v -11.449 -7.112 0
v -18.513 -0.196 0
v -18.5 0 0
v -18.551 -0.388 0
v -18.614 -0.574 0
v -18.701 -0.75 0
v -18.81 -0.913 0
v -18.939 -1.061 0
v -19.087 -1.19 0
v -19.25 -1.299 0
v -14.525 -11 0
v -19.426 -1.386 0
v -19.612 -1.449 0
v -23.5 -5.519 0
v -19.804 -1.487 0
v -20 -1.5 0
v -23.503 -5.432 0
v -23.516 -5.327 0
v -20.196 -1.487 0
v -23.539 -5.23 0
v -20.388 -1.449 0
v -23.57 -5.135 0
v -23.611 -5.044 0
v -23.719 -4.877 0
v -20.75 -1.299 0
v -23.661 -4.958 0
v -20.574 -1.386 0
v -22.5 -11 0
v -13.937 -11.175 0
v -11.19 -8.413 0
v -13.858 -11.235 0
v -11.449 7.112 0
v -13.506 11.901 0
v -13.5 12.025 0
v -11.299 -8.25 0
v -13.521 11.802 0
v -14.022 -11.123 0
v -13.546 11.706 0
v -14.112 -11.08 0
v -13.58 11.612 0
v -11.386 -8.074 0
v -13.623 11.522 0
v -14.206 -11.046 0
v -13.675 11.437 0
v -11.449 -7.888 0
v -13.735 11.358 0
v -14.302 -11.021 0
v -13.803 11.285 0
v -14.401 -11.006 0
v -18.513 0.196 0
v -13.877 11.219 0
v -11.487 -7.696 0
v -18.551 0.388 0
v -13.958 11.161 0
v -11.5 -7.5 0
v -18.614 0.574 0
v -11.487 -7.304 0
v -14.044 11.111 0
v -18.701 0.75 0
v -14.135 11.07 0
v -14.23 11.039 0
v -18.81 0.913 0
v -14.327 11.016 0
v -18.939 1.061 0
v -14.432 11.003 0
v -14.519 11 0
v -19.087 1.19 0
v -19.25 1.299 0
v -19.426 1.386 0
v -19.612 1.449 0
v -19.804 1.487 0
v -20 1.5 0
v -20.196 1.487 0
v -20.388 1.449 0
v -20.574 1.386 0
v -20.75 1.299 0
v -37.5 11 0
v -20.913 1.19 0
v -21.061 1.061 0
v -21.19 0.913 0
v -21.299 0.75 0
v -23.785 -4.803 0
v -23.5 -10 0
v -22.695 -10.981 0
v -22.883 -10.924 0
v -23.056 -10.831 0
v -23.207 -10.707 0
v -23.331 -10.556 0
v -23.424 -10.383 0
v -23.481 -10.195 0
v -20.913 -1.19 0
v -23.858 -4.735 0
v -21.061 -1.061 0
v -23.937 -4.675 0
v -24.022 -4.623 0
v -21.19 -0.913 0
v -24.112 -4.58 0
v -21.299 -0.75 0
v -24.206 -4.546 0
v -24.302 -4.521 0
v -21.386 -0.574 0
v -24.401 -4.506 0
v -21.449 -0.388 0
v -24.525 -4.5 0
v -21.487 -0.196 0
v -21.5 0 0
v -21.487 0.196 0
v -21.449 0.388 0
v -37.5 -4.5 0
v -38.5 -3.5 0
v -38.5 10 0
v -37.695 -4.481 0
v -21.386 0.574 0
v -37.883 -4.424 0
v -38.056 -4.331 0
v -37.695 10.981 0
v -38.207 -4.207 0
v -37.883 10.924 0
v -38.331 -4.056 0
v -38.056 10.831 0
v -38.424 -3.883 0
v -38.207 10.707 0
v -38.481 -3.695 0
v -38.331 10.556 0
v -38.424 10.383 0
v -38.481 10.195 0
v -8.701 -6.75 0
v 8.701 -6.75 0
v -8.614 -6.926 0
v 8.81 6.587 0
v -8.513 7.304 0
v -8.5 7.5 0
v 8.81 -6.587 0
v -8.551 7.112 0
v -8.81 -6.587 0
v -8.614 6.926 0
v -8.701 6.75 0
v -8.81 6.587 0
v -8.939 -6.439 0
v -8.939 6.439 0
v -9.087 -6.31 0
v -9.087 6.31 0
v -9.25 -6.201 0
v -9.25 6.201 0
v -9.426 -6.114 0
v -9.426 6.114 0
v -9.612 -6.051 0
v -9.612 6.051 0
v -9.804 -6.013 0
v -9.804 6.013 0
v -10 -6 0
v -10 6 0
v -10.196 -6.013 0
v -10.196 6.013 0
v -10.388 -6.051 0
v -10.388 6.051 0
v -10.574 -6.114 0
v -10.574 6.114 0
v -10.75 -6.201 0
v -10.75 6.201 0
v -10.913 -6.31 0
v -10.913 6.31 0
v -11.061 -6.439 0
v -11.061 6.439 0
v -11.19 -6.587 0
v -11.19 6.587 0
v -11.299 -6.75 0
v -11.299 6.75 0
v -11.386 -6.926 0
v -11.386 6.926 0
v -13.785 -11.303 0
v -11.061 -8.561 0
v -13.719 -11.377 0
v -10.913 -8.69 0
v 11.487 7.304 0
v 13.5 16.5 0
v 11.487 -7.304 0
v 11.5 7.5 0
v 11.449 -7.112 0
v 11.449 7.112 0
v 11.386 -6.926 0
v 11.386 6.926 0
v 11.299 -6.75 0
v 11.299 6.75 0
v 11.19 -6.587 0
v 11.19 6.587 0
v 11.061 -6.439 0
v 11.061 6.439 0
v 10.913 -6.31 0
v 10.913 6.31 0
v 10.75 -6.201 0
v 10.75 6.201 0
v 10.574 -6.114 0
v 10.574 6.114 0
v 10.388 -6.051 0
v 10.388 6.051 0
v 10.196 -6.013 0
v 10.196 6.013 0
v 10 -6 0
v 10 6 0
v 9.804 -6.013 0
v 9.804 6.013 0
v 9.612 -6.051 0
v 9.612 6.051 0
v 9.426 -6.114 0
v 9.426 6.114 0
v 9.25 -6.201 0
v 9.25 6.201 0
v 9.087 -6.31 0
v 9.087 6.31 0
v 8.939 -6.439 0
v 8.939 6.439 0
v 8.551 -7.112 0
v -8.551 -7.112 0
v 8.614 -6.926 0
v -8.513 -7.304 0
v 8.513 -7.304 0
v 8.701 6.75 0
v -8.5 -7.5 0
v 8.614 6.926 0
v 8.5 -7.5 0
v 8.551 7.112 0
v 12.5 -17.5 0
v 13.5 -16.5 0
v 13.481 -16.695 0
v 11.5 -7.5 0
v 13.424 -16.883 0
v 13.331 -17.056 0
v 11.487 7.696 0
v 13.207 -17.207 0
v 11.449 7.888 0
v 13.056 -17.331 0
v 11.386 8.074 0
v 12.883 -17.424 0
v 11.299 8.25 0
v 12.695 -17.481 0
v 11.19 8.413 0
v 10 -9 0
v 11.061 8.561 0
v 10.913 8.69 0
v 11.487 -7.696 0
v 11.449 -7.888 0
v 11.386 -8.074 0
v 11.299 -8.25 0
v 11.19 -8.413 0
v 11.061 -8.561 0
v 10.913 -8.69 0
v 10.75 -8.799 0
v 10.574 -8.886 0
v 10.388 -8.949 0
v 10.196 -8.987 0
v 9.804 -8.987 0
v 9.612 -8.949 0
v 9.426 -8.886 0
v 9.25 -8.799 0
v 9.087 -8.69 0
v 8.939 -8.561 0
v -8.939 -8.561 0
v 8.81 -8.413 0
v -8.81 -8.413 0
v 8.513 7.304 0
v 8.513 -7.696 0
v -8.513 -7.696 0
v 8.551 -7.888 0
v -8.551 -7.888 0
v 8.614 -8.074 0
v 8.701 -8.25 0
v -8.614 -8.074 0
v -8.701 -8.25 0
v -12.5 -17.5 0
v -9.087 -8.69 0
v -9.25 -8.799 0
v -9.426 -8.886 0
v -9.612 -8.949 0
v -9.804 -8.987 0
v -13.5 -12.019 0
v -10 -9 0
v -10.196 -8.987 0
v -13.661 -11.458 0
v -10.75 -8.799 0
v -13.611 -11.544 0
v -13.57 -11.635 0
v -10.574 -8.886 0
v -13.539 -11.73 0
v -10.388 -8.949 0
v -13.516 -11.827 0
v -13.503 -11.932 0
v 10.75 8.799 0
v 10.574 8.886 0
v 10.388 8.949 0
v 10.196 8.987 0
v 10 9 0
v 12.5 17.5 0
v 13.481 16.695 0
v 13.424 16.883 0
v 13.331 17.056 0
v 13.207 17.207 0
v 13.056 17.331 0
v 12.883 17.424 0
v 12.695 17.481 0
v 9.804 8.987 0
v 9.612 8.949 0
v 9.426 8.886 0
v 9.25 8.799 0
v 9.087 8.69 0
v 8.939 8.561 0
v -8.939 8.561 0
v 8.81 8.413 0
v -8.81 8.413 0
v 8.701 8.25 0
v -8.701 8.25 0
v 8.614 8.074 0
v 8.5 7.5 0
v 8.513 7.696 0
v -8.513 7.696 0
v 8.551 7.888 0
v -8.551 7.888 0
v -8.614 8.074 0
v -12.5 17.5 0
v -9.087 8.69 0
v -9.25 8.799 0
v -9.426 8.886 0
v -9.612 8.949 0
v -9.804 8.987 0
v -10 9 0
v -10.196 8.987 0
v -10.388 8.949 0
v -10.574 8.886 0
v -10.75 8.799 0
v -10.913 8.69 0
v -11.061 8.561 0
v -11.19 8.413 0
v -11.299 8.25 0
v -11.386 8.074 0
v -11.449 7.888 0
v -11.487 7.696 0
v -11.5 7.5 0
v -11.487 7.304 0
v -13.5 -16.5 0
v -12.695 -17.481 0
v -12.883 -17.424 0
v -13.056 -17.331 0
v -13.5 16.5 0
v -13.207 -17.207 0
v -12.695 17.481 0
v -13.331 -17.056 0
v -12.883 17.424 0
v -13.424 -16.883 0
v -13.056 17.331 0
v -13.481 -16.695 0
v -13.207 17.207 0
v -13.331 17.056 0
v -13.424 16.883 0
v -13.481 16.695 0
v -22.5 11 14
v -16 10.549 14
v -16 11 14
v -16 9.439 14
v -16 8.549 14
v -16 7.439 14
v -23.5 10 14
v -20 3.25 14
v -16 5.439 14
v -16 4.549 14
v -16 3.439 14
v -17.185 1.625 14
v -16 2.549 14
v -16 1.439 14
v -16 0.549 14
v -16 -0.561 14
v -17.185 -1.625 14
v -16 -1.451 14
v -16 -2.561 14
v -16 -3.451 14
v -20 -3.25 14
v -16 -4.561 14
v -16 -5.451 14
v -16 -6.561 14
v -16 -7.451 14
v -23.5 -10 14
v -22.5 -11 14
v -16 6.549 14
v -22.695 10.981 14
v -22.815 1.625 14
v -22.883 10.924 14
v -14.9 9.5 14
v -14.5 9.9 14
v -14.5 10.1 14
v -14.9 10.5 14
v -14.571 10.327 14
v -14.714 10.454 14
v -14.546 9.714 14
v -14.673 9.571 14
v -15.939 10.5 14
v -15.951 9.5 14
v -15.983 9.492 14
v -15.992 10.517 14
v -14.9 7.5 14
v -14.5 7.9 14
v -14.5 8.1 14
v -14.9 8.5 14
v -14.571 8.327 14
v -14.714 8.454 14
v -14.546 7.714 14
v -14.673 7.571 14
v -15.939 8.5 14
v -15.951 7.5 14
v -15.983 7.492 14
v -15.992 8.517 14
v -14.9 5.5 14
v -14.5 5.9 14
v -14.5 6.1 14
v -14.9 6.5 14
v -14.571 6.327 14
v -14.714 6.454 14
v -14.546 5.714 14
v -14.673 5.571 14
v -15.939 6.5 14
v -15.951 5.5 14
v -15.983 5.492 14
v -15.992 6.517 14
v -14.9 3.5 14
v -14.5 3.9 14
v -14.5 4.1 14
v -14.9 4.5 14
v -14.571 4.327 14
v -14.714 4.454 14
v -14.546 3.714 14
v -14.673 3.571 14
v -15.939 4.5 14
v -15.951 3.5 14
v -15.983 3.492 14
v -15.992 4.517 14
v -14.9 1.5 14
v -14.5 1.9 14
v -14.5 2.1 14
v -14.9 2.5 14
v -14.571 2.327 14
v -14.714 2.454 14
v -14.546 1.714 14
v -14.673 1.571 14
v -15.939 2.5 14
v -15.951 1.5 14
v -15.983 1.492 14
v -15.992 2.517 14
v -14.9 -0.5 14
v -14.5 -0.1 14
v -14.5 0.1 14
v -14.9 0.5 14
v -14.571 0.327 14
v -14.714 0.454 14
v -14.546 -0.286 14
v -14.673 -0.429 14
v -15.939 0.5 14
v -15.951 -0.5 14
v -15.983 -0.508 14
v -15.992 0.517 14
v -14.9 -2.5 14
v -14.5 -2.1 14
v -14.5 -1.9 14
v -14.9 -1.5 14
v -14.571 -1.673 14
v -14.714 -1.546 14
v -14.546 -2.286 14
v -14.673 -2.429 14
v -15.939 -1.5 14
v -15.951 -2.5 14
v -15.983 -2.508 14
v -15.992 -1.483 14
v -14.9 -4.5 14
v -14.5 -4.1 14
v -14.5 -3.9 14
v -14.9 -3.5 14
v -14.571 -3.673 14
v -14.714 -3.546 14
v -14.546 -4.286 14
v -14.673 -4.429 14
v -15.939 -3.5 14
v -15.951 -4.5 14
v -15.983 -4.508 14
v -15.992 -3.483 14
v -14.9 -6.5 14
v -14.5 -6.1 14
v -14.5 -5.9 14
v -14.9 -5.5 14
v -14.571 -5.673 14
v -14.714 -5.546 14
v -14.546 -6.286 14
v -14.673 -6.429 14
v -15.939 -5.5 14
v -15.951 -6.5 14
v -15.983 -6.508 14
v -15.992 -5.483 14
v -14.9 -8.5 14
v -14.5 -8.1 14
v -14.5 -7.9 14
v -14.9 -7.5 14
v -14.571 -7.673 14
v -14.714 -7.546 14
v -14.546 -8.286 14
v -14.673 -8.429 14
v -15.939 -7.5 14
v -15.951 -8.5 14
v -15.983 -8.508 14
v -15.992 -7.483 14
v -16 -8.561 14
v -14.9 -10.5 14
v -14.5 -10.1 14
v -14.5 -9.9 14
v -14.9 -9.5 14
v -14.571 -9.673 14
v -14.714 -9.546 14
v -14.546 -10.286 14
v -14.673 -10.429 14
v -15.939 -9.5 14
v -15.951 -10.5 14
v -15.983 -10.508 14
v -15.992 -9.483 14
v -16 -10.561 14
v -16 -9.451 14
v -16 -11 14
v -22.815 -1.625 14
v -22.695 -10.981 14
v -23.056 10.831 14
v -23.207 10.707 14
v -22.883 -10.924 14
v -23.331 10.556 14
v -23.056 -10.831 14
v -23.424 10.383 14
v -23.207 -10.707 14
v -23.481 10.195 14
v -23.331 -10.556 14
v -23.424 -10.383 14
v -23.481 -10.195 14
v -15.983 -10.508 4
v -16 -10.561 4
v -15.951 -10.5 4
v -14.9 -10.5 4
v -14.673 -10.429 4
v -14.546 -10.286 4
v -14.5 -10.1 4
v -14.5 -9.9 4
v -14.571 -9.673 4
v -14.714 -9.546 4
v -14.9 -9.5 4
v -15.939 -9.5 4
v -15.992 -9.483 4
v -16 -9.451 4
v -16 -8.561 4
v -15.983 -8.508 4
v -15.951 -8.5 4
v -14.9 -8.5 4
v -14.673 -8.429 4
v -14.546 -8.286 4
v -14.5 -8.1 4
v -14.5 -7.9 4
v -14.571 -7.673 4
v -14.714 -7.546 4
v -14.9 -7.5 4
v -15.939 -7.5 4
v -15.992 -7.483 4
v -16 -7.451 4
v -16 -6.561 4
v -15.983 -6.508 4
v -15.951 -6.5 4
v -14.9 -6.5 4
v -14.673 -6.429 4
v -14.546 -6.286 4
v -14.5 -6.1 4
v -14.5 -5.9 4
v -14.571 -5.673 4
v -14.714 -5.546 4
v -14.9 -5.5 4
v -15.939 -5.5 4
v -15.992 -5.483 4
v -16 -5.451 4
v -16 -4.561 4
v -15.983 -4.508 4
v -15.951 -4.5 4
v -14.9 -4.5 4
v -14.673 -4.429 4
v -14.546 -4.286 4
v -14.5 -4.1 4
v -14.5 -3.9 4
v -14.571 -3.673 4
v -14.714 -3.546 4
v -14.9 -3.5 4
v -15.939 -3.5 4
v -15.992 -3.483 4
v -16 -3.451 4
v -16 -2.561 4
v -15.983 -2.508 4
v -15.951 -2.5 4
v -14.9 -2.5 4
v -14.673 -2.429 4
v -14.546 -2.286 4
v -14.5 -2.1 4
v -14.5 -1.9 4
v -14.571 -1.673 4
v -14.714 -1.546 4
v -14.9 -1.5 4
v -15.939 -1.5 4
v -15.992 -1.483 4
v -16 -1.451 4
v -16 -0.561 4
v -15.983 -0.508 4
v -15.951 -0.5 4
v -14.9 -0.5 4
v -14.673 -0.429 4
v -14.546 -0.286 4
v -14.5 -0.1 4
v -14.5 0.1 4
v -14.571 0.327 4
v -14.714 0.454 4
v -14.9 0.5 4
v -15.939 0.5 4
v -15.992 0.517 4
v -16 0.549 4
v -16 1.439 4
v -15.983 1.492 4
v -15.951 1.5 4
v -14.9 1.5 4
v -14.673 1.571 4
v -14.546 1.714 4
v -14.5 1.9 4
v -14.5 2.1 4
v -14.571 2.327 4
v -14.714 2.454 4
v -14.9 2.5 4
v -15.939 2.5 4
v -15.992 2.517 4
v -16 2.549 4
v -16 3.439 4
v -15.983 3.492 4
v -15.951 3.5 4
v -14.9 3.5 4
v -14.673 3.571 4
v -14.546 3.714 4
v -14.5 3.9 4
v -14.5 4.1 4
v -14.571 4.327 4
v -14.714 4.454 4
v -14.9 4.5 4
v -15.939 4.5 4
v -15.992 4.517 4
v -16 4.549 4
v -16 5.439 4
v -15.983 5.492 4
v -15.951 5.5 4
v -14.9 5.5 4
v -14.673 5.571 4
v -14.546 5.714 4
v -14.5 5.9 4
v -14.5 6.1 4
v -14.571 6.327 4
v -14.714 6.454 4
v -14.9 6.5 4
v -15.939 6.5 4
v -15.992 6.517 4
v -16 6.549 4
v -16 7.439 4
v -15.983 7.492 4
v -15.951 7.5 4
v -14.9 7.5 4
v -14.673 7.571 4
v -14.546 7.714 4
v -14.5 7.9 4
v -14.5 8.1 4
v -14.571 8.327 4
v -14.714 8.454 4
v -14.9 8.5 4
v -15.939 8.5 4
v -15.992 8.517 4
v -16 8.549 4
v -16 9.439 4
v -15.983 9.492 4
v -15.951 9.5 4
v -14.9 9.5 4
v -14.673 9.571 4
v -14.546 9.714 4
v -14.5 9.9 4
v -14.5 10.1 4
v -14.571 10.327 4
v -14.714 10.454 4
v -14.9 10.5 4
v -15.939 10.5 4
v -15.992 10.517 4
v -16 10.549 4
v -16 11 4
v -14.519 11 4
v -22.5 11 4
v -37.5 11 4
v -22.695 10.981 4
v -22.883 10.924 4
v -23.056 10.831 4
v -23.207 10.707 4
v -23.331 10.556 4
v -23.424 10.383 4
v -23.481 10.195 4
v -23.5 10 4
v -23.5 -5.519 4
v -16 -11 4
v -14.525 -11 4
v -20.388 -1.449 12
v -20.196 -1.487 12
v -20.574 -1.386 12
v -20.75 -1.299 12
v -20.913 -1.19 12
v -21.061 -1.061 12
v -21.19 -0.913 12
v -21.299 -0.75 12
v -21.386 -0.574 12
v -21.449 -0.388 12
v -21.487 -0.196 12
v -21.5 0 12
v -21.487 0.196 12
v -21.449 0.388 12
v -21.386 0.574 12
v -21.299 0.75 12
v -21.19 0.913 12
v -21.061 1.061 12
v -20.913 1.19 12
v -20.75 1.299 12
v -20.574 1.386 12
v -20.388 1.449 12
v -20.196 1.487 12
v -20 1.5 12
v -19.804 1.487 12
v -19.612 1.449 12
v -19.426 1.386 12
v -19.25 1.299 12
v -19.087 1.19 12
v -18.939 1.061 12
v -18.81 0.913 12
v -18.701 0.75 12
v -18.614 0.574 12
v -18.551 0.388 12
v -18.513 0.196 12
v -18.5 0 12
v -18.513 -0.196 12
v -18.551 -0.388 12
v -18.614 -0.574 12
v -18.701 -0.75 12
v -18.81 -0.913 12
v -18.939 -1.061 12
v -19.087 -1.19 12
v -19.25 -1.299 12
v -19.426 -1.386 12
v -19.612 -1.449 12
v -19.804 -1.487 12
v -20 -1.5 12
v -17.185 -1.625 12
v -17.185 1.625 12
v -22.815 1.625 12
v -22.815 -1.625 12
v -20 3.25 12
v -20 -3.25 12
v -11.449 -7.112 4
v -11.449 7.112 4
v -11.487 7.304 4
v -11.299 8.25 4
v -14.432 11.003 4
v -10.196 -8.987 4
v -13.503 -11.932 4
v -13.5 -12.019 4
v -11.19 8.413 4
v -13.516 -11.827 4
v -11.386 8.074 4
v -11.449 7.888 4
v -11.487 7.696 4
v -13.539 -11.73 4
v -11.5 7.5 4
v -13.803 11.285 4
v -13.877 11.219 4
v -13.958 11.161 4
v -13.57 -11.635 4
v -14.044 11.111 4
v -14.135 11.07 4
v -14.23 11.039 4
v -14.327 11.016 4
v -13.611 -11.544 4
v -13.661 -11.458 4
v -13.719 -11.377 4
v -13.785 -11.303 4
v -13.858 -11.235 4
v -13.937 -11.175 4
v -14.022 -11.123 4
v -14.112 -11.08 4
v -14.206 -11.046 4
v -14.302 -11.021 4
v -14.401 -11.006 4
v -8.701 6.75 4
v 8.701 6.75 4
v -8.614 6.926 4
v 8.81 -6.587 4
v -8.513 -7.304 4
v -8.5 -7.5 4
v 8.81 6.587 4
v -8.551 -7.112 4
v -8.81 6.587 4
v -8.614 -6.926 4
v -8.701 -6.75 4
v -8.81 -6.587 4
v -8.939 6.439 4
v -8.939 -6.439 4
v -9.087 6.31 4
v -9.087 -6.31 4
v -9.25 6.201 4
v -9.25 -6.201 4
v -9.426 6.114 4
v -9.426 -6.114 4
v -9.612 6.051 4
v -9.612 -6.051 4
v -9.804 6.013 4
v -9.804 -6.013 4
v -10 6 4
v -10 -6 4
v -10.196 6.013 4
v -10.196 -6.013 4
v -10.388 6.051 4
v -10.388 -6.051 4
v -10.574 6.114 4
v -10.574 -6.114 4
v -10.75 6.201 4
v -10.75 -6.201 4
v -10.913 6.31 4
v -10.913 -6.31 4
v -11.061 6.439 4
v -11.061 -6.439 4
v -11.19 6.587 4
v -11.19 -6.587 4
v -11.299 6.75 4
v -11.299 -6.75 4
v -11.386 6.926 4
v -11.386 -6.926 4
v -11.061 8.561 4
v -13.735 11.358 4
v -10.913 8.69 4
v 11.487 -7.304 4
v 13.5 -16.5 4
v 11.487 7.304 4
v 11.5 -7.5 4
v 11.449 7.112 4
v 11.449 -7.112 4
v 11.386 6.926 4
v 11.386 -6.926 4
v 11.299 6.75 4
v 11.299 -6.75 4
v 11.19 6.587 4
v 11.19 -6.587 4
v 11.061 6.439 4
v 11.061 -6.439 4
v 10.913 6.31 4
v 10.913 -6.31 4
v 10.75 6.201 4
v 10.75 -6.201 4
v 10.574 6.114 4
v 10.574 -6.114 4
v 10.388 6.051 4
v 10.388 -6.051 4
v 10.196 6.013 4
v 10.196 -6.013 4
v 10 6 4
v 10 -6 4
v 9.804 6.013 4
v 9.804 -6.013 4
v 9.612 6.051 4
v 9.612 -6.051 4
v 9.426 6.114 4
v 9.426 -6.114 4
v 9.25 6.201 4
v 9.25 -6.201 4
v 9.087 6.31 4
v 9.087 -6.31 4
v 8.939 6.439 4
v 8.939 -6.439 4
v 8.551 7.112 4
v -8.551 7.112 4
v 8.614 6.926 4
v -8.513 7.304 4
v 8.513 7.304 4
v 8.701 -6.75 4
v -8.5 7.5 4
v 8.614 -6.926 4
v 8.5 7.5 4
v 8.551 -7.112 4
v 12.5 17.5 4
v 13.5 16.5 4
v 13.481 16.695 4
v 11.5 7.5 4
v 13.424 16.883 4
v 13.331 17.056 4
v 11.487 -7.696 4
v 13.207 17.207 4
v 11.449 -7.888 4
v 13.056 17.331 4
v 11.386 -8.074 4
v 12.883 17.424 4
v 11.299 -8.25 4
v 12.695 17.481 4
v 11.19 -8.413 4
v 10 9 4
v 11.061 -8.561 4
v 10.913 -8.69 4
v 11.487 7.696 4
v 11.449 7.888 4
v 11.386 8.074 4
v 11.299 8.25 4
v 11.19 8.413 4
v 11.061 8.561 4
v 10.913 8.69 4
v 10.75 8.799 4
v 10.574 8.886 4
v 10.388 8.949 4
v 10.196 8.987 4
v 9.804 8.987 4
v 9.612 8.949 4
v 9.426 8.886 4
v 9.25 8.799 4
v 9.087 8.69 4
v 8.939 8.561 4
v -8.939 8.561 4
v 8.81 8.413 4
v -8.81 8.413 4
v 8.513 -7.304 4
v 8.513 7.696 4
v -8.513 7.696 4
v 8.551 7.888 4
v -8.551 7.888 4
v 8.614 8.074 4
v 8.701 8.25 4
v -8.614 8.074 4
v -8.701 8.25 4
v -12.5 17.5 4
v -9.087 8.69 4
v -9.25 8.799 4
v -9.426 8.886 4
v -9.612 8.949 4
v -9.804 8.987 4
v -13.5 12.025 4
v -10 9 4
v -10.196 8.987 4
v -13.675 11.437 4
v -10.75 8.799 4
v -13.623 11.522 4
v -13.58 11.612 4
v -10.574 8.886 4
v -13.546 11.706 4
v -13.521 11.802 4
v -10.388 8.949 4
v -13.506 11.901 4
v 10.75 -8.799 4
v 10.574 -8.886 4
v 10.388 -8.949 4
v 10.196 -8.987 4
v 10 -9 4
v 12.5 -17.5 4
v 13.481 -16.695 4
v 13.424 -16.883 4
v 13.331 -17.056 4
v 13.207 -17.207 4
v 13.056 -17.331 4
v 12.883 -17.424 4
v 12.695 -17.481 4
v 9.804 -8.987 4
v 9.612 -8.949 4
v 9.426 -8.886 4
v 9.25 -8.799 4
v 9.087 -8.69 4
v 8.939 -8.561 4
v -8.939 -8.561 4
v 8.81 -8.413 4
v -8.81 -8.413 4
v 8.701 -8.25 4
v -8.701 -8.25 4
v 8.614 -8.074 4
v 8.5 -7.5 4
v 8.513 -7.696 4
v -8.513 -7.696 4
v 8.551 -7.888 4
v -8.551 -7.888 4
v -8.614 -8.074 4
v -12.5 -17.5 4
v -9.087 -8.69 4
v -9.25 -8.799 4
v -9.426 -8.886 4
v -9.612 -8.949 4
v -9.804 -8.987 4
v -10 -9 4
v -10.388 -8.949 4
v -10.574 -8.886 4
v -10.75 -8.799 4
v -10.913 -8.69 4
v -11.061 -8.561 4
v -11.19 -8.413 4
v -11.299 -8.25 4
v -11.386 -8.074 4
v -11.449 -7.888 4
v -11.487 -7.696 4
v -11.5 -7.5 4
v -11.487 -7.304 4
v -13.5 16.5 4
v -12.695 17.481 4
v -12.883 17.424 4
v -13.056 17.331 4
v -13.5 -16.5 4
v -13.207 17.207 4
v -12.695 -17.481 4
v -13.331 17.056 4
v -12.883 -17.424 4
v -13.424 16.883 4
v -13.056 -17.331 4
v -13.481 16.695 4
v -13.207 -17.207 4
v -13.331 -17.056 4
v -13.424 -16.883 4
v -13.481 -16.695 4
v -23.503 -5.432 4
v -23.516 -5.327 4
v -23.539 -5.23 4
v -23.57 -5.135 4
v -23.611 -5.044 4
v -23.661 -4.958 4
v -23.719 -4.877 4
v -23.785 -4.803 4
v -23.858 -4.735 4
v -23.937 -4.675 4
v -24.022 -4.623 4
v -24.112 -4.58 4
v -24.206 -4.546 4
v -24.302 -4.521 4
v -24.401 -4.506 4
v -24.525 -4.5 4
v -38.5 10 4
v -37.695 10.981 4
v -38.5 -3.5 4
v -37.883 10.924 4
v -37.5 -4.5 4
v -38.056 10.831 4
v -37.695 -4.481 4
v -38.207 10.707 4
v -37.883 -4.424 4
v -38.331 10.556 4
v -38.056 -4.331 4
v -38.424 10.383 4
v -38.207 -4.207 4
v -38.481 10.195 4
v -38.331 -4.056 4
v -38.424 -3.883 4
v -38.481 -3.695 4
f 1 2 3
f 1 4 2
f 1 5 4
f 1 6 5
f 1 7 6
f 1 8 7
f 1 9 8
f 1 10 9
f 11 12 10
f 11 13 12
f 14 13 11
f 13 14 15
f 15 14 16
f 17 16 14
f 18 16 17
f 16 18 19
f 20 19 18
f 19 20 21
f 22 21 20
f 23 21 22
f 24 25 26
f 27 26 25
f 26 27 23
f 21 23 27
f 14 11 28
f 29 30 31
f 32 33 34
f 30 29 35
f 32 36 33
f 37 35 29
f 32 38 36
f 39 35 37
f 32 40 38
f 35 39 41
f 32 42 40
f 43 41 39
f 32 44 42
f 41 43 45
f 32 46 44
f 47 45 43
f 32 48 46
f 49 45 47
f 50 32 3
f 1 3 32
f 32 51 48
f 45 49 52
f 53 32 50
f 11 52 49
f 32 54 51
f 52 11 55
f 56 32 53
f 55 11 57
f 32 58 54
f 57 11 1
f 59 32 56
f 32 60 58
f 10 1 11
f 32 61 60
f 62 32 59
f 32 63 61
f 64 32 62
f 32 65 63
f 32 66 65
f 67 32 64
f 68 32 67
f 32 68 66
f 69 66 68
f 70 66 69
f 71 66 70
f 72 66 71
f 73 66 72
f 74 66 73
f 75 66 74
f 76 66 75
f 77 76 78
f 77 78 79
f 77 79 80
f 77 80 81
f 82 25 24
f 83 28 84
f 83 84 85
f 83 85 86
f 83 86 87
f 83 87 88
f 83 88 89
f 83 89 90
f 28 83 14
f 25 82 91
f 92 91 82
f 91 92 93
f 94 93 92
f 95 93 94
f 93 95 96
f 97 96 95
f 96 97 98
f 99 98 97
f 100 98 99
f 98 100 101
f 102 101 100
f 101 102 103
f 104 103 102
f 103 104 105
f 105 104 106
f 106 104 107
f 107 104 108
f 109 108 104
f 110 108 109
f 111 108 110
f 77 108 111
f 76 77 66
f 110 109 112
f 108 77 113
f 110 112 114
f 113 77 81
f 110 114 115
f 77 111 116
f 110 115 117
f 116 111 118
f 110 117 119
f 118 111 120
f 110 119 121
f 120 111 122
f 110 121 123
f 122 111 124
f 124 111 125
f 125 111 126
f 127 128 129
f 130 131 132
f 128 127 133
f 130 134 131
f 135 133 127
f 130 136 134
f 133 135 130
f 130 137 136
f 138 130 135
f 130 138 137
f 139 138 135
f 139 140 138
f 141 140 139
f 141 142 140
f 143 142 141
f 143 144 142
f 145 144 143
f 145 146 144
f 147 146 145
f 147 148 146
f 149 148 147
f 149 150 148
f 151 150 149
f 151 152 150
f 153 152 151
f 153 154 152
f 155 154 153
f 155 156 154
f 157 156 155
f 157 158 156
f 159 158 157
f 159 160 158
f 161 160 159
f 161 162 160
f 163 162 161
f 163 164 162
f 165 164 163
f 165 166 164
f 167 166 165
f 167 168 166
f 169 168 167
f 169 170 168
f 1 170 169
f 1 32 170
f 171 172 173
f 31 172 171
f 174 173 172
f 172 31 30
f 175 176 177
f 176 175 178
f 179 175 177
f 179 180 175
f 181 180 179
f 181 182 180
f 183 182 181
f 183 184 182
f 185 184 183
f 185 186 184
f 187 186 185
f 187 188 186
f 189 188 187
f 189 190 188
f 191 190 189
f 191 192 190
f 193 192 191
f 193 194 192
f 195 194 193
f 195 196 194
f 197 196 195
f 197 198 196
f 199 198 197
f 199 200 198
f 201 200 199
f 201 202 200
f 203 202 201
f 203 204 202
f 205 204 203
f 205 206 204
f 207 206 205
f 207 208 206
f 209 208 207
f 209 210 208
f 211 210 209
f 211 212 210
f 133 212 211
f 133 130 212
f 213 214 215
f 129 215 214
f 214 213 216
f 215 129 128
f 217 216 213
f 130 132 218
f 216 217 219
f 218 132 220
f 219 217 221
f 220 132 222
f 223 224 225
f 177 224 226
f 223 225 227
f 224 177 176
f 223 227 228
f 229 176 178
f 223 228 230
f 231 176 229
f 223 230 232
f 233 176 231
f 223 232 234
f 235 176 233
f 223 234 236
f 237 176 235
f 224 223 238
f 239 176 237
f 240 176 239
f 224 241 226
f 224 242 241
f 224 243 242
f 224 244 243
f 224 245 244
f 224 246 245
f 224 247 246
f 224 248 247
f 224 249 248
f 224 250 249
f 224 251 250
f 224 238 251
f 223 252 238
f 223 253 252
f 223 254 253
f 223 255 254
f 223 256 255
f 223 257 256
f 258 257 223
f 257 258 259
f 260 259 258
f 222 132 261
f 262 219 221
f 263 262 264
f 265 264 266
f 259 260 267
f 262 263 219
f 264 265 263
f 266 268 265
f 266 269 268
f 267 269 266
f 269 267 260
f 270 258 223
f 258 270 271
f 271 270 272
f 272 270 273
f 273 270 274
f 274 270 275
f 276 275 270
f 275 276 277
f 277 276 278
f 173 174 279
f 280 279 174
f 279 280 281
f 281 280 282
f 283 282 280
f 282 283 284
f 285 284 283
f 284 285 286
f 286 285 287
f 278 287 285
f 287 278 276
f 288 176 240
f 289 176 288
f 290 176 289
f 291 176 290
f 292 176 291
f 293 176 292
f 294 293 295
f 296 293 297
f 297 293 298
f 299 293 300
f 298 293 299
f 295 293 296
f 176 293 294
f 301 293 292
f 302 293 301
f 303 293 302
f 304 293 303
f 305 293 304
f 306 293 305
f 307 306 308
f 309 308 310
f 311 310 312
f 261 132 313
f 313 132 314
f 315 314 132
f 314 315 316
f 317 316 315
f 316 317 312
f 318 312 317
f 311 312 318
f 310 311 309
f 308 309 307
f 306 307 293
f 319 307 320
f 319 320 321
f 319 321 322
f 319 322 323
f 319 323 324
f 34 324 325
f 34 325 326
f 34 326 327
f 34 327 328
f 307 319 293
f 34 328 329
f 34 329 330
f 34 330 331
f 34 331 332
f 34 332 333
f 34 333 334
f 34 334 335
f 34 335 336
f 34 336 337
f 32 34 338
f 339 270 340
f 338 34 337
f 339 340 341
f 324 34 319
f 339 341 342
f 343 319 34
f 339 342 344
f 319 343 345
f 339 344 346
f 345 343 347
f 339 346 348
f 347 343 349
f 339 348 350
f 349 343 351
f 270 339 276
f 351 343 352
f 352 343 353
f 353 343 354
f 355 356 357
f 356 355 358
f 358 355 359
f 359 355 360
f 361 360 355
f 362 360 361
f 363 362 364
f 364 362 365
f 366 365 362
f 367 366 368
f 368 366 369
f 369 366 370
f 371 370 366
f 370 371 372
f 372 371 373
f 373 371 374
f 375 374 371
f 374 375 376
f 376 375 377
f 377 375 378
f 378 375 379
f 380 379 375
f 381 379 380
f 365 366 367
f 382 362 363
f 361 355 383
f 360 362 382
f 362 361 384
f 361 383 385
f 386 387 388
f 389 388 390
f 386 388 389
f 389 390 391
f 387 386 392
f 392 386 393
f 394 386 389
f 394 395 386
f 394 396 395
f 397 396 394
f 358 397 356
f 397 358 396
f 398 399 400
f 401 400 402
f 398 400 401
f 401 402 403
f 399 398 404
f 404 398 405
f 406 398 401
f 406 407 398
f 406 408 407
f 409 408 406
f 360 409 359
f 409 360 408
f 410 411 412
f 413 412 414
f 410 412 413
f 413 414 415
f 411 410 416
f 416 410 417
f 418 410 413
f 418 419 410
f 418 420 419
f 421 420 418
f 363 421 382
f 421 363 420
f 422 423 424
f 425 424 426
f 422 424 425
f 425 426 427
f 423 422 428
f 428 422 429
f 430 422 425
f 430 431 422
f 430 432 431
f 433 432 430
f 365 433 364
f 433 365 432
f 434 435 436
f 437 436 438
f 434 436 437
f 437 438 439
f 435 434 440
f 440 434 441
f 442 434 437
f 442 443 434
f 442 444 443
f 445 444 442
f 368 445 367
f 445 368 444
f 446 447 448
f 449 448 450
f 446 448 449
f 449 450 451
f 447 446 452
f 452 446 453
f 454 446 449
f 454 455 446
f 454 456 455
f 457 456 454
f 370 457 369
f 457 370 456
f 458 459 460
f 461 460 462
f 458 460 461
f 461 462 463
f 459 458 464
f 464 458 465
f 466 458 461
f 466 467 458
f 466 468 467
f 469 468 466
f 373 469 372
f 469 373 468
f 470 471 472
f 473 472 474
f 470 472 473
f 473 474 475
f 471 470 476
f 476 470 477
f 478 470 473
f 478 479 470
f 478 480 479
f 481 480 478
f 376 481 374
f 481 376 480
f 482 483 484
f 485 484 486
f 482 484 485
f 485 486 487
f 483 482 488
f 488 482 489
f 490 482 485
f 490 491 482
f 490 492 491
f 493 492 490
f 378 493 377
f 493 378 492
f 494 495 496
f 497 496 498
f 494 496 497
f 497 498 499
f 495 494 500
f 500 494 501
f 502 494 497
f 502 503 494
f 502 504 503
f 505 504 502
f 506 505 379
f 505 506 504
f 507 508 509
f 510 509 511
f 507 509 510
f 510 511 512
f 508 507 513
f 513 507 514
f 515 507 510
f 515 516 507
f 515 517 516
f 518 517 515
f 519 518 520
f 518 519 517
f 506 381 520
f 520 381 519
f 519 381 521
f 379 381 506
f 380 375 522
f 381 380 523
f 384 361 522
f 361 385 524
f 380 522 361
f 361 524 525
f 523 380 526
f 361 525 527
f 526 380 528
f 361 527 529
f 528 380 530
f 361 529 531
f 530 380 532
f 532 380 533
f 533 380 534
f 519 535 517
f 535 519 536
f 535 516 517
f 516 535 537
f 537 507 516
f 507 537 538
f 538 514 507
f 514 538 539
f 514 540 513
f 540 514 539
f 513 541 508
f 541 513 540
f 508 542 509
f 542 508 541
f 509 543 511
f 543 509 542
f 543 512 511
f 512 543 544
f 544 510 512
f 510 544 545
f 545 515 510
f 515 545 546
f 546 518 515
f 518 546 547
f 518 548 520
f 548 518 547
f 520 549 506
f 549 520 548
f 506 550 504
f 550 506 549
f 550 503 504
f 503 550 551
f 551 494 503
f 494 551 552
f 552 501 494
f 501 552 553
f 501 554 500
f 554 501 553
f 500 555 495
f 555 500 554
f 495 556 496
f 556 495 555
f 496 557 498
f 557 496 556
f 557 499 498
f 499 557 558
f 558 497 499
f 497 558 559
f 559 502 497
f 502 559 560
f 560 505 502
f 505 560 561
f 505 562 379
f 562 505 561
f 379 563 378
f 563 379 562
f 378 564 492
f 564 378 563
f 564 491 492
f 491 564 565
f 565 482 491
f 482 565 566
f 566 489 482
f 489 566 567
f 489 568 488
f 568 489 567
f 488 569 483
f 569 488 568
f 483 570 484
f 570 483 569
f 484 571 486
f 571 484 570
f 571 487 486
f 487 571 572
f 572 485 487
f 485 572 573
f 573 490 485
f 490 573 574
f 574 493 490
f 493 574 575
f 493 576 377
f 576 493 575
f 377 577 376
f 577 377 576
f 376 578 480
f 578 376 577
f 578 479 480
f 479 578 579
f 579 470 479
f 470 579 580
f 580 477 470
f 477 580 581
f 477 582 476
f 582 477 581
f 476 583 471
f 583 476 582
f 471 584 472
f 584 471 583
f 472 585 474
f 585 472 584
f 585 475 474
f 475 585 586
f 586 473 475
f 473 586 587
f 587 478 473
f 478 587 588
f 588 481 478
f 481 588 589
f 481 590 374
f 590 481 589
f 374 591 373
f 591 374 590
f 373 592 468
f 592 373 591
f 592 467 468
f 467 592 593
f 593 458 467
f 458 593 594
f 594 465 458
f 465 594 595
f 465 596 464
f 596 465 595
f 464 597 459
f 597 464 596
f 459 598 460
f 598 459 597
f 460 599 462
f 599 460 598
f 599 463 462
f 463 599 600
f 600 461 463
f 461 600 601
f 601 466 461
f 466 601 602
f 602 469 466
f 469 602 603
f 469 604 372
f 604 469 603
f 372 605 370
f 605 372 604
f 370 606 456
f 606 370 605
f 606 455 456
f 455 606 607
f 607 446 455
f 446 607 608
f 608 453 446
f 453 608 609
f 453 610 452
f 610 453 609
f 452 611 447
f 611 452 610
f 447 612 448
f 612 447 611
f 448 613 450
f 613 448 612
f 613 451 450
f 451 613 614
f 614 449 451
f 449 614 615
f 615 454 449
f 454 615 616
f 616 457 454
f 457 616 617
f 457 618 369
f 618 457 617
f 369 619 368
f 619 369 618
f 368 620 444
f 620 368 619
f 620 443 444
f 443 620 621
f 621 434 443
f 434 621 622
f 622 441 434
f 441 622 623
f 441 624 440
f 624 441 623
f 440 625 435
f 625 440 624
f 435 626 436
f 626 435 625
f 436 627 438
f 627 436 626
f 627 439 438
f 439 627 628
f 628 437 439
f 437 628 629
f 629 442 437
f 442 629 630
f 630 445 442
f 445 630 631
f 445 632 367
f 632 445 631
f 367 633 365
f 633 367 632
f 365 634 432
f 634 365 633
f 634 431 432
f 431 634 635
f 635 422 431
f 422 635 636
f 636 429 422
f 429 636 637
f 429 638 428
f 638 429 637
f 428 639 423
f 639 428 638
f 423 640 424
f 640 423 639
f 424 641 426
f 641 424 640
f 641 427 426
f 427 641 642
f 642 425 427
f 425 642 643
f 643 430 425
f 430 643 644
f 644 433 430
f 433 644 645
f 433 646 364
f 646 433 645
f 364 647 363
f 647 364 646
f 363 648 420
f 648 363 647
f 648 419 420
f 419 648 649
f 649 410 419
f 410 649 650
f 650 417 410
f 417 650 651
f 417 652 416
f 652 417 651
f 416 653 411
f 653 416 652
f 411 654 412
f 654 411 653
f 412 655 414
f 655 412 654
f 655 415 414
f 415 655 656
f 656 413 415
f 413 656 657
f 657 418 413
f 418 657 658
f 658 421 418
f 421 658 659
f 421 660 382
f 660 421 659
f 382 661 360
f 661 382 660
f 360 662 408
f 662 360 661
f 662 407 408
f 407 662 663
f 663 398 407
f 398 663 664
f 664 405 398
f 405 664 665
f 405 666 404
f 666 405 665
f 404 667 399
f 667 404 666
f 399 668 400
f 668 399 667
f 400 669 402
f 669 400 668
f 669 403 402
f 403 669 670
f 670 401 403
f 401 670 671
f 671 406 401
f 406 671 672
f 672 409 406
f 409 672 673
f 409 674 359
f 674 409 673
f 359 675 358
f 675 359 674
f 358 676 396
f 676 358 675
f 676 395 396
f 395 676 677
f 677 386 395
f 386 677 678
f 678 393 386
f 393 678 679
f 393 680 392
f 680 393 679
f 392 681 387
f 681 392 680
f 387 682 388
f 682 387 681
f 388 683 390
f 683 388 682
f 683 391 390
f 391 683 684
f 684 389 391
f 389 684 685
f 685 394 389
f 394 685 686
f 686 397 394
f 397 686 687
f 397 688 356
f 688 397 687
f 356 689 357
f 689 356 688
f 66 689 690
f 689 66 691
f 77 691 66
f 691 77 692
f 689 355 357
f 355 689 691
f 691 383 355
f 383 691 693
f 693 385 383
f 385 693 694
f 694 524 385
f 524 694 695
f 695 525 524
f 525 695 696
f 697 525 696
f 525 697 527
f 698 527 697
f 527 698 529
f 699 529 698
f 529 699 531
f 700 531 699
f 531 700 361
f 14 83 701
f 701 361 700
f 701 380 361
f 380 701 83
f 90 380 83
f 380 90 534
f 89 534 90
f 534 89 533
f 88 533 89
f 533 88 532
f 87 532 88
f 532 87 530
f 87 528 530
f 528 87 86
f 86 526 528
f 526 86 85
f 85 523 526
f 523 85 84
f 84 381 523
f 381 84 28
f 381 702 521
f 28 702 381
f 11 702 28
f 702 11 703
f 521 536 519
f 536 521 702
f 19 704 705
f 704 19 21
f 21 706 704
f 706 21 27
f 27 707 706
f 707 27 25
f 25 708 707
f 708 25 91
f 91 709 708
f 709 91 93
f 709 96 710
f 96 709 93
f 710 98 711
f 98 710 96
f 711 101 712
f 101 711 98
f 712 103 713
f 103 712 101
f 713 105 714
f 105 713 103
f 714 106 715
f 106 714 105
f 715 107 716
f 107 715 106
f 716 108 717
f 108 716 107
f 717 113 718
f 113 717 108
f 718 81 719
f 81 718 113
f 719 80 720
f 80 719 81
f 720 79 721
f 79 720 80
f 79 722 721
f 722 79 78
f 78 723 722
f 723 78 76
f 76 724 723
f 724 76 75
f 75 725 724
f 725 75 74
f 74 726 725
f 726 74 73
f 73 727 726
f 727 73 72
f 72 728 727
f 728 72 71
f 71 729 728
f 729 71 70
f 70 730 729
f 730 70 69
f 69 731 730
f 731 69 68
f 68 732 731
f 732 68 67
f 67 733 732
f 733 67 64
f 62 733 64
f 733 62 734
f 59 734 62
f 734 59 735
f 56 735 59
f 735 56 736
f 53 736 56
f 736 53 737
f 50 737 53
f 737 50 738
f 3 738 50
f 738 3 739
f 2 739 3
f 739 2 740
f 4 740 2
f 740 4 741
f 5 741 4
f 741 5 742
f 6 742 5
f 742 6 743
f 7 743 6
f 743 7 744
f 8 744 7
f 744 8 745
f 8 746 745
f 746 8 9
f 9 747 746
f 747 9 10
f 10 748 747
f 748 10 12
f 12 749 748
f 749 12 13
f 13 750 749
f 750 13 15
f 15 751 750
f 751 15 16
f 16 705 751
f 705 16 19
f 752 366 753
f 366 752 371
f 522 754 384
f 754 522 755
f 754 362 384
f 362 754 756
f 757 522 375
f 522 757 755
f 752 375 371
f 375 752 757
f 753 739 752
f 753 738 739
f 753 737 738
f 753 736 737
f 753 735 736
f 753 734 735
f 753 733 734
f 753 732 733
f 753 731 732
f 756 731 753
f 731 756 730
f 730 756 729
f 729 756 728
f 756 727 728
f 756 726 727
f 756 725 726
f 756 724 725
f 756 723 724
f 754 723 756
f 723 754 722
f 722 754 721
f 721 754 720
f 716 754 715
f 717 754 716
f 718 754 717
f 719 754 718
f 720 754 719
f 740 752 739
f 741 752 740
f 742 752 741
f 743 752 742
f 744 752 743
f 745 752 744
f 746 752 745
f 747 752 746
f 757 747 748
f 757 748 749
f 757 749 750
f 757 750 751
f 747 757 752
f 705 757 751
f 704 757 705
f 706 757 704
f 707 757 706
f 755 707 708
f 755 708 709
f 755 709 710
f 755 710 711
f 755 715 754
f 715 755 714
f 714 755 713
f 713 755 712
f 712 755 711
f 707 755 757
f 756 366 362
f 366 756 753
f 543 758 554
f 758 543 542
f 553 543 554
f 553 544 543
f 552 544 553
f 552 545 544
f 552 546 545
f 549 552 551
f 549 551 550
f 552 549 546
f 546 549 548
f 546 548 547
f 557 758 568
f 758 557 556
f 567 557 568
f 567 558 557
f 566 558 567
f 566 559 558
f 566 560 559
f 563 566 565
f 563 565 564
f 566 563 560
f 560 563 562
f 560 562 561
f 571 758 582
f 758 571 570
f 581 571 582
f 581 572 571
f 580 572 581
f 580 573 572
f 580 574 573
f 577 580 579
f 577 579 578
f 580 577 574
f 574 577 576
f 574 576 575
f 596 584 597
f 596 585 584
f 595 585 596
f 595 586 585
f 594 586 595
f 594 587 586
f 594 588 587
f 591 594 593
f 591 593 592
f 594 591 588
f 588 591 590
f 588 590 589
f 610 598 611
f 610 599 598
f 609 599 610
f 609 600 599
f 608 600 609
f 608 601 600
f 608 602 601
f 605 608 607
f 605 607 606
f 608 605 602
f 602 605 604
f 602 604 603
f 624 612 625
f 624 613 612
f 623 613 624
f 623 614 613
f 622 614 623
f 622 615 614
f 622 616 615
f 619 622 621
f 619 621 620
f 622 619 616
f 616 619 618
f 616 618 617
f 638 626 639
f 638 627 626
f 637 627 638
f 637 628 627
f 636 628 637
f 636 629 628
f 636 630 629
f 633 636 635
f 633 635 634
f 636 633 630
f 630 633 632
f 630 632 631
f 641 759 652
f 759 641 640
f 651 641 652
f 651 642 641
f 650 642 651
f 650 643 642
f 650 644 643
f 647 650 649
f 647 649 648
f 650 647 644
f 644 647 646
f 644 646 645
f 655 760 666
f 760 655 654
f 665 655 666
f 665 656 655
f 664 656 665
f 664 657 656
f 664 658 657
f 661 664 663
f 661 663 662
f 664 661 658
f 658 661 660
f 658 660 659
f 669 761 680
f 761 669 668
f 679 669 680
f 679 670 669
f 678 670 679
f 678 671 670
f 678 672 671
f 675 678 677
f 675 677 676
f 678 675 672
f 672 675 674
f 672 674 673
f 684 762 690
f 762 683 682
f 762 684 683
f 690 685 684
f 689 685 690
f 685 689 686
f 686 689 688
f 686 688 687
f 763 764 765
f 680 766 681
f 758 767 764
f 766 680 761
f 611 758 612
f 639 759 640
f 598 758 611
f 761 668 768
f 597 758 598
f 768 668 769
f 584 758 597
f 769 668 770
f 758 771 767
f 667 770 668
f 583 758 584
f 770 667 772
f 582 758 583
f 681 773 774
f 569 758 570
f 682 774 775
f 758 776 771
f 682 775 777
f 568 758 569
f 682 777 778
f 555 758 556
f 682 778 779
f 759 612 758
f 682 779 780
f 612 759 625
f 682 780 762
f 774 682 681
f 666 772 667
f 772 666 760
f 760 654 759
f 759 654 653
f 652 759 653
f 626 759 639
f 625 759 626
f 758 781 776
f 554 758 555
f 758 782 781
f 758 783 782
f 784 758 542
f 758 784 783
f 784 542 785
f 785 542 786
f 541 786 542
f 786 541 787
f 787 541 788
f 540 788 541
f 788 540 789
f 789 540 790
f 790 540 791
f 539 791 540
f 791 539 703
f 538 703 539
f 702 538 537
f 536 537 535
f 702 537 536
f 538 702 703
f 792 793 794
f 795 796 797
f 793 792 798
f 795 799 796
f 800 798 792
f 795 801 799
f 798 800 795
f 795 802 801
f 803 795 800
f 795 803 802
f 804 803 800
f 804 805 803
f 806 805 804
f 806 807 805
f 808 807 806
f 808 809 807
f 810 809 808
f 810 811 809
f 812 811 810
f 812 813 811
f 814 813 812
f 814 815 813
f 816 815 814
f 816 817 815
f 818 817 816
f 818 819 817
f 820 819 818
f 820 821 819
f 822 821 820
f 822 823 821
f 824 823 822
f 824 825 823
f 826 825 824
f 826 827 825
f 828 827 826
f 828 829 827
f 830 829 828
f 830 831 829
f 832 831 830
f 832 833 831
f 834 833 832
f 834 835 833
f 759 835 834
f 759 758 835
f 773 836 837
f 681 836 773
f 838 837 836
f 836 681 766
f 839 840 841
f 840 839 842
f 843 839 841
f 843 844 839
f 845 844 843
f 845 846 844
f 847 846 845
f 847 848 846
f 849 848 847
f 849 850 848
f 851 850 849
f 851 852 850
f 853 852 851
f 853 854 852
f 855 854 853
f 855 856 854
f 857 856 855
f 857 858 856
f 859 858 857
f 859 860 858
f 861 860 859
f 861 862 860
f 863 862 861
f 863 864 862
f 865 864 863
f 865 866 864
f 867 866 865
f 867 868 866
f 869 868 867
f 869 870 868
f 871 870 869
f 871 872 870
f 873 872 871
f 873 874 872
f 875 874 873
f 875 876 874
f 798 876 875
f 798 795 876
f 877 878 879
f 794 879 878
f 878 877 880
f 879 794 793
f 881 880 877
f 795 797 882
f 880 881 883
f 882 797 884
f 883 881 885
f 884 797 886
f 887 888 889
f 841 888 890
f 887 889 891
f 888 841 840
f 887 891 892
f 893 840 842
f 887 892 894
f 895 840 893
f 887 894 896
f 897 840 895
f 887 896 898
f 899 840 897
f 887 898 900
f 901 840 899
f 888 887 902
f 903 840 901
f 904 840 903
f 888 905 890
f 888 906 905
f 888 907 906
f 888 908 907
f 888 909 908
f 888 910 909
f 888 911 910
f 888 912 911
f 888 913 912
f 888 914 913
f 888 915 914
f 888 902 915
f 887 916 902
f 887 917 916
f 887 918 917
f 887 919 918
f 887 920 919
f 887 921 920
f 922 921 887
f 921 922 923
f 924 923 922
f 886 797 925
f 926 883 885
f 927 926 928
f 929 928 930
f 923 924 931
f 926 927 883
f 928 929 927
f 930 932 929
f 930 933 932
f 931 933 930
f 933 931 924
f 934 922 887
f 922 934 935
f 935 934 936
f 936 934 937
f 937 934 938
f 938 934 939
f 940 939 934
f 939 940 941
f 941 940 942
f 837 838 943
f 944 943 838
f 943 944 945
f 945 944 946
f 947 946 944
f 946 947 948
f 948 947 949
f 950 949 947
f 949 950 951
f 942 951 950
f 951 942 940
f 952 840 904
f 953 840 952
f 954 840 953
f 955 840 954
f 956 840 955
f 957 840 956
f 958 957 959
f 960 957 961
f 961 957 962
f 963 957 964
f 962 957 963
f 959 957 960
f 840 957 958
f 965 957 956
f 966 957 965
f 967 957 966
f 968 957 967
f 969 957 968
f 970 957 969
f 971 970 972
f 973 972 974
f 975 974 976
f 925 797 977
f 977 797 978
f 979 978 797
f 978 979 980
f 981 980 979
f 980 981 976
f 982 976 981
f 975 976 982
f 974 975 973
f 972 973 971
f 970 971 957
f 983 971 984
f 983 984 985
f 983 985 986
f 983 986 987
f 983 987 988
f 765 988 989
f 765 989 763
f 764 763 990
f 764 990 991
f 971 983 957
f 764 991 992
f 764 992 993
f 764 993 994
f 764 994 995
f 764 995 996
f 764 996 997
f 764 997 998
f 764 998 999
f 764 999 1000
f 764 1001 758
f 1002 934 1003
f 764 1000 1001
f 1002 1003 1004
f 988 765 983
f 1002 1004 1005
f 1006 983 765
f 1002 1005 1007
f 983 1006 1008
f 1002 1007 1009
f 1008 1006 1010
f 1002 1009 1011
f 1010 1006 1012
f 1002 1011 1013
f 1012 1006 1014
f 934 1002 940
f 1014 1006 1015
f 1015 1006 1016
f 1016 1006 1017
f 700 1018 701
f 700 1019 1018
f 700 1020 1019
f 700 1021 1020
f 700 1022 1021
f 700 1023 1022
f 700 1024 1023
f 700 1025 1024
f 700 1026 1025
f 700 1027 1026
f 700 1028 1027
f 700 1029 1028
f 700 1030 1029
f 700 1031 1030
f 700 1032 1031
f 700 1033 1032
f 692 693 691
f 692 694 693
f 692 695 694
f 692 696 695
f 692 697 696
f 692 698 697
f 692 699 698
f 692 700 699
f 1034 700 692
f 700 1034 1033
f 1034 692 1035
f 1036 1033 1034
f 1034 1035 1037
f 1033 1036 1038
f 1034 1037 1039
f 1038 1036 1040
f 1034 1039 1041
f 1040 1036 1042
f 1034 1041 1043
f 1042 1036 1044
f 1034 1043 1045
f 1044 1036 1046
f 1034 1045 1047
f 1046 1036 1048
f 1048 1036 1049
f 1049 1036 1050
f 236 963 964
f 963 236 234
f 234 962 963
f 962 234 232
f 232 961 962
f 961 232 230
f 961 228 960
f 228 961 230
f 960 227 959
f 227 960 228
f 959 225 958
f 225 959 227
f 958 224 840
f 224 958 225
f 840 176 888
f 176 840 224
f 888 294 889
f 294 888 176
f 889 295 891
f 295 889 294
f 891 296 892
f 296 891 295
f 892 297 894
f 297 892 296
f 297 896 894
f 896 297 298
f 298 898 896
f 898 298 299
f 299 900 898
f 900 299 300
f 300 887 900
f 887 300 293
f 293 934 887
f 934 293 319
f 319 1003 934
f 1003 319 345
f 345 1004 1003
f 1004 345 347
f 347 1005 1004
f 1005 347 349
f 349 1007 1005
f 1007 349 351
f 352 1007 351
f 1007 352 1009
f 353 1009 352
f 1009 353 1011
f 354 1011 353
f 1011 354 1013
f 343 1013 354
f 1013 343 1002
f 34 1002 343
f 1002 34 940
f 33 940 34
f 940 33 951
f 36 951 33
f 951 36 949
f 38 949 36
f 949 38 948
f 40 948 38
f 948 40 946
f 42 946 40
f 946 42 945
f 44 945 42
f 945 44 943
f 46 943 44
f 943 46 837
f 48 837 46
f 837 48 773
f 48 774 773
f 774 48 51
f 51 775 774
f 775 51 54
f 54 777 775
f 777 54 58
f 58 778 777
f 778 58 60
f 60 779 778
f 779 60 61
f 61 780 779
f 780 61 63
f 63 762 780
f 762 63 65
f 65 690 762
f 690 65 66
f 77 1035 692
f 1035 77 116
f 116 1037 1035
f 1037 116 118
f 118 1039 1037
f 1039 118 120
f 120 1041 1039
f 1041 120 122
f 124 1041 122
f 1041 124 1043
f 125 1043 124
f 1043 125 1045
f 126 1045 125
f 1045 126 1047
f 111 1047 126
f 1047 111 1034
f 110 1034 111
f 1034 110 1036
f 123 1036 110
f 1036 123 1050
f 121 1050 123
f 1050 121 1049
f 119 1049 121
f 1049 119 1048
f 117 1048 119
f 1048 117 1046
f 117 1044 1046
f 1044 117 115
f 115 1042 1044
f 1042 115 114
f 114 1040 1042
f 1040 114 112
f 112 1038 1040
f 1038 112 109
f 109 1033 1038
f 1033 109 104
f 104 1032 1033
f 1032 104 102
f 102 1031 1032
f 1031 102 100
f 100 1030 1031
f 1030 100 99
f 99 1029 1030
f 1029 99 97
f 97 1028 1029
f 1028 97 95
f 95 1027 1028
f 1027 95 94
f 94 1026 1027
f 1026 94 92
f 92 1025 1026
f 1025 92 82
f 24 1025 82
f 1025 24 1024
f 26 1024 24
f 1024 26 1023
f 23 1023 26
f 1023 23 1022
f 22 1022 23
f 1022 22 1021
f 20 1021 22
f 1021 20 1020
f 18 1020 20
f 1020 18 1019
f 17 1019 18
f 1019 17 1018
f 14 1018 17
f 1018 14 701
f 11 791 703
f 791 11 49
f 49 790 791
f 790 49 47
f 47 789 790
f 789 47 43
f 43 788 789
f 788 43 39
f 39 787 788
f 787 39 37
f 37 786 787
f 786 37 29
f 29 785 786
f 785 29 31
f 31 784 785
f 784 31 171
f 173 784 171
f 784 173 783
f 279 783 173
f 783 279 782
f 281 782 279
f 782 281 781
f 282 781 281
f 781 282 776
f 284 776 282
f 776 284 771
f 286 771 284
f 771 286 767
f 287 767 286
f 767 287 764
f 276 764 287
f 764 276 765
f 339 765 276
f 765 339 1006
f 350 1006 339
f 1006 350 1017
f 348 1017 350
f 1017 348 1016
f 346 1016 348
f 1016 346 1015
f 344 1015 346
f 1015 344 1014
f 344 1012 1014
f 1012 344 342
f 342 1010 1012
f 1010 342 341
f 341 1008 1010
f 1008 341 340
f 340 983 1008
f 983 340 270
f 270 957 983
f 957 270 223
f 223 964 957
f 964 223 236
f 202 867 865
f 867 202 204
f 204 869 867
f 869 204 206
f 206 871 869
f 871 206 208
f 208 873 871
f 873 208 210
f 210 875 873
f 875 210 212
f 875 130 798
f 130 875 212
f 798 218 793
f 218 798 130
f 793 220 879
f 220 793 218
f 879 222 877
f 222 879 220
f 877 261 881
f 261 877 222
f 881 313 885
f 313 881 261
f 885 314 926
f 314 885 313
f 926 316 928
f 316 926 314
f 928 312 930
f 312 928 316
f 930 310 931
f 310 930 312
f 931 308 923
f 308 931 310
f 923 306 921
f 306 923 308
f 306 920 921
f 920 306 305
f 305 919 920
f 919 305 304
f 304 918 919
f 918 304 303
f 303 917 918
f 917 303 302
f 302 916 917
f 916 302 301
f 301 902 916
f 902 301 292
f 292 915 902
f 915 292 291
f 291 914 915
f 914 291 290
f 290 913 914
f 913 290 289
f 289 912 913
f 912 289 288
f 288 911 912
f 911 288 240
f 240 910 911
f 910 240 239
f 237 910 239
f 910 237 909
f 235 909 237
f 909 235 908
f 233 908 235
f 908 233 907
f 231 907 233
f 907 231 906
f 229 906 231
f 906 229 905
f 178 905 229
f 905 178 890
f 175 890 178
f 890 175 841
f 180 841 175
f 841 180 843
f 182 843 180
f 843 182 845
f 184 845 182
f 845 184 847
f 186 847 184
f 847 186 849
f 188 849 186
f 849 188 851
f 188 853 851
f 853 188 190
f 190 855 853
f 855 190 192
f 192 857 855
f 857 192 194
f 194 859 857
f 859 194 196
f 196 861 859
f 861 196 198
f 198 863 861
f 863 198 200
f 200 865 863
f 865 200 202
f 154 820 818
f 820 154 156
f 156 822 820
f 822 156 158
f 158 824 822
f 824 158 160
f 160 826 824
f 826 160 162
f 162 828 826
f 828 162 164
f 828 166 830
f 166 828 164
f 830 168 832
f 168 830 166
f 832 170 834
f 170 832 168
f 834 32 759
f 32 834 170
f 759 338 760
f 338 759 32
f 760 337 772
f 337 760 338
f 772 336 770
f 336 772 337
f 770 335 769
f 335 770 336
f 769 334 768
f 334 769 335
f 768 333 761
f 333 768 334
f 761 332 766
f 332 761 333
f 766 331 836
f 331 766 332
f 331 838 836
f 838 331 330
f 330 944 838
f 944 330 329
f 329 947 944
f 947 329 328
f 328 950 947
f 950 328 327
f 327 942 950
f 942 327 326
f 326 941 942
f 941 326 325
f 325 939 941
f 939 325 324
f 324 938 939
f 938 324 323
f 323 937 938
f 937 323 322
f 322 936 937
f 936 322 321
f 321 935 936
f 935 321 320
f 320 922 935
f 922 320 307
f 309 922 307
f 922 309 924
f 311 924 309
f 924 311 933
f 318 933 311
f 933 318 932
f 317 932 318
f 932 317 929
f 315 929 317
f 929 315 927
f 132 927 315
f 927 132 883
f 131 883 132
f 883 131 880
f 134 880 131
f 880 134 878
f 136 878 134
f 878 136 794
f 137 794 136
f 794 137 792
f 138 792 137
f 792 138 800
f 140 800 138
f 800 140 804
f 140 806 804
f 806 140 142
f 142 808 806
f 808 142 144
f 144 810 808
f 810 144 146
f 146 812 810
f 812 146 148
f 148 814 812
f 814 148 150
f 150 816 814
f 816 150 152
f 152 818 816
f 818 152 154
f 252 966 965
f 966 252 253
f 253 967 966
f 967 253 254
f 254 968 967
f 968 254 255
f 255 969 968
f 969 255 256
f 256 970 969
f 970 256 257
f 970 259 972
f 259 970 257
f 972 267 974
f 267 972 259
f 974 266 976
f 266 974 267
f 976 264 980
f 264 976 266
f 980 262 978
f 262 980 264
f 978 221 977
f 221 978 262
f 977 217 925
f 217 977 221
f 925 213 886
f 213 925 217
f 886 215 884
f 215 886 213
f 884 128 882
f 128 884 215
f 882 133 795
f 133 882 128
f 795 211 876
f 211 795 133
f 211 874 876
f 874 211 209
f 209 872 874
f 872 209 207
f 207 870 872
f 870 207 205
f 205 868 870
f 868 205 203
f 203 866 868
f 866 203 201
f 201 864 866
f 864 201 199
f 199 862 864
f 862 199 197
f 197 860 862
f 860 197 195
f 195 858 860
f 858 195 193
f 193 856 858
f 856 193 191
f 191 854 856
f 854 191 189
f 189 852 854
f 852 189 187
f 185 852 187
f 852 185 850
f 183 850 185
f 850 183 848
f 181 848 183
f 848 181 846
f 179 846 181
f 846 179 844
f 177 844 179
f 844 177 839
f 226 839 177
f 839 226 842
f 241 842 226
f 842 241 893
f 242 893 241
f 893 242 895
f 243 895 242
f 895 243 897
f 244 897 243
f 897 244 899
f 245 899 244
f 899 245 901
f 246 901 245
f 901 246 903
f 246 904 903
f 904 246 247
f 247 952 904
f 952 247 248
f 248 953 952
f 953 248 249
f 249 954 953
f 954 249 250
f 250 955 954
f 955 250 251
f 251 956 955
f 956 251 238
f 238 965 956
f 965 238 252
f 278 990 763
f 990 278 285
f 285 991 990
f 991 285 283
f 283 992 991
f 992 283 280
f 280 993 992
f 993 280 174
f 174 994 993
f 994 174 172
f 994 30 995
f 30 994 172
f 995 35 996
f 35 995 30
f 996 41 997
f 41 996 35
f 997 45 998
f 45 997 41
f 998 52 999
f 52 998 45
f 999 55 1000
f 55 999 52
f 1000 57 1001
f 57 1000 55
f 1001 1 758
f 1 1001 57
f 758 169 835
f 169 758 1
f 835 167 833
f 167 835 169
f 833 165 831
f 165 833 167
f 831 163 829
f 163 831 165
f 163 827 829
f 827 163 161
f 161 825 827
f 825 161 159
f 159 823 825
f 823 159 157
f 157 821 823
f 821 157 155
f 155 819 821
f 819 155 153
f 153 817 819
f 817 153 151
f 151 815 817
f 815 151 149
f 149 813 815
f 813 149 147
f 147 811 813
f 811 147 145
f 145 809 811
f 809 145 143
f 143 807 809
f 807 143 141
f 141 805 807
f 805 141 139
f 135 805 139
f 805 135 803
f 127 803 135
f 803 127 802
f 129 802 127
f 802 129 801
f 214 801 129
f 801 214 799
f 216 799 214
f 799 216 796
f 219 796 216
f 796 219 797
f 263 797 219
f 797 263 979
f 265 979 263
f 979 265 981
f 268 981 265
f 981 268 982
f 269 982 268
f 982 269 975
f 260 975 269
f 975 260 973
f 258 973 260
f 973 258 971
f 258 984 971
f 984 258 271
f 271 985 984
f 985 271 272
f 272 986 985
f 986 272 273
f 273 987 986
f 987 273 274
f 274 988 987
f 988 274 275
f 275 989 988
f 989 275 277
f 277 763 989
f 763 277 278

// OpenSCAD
B = 20;
C = 15;
L = 35;
L1 = 22;
W = 27;
h = 12;

trigger = 10 + 3;

$fs = .2;
$fa = 2;

difference() {
	linear_extrude(4, convexity = 5) difference() {
		offset(1) offset(-2) offset(1) {
			square([W, L], center = true);
			translate([-5, 0, 0]) square([W + 10, L1], center = true);
			translate([-W/2 - 10 - 15, -L/2 + trigger, 0]) square([W/2 + 10 + 15, L/2 + L1/2 - trigger]);
		}
		for(x = [1, -1], y = [1, -1]) translate([x * B/2, y * C/2, 0]) circle(3 / 2);
		translate([-20, 0, 0]) circle(3 / 2);
	}
}

difference() {
	linear_extrude(2 + h, convexity = 5) difference() {
		offset(1) offset(-2) offset(1) {
			translate([-5, 0, 0]) square([W + 10, L1], center = true);
		}
		translate([-20, 0, 0]) circle(3 / 2);
		offset(-.4) offset(.4) {
			square([W + 2, L + 2], center = true);
			for(i = [.5:10], j = [1, -1]) translate([0, 2 * i * j, 0]) square([W + 5, 1], center = true);
		}
;
	}
	translate([-20, 0, h]) rotate(90) cylinder(r = 6.5/2, h = 10, $fn = 6);
}
